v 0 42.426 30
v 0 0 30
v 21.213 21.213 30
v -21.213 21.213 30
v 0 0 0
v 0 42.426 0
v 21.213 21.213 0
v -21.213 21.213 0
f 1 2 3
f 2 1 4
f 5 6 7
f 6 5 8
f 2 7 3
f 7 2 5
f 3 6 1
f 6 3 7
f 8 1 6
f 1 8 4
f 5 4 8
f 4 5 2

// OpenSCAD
rotate(a=[0, 0, 45]){
    color("#CC5500"){
        cube(size=[30, 30, 30]);
    };
};
